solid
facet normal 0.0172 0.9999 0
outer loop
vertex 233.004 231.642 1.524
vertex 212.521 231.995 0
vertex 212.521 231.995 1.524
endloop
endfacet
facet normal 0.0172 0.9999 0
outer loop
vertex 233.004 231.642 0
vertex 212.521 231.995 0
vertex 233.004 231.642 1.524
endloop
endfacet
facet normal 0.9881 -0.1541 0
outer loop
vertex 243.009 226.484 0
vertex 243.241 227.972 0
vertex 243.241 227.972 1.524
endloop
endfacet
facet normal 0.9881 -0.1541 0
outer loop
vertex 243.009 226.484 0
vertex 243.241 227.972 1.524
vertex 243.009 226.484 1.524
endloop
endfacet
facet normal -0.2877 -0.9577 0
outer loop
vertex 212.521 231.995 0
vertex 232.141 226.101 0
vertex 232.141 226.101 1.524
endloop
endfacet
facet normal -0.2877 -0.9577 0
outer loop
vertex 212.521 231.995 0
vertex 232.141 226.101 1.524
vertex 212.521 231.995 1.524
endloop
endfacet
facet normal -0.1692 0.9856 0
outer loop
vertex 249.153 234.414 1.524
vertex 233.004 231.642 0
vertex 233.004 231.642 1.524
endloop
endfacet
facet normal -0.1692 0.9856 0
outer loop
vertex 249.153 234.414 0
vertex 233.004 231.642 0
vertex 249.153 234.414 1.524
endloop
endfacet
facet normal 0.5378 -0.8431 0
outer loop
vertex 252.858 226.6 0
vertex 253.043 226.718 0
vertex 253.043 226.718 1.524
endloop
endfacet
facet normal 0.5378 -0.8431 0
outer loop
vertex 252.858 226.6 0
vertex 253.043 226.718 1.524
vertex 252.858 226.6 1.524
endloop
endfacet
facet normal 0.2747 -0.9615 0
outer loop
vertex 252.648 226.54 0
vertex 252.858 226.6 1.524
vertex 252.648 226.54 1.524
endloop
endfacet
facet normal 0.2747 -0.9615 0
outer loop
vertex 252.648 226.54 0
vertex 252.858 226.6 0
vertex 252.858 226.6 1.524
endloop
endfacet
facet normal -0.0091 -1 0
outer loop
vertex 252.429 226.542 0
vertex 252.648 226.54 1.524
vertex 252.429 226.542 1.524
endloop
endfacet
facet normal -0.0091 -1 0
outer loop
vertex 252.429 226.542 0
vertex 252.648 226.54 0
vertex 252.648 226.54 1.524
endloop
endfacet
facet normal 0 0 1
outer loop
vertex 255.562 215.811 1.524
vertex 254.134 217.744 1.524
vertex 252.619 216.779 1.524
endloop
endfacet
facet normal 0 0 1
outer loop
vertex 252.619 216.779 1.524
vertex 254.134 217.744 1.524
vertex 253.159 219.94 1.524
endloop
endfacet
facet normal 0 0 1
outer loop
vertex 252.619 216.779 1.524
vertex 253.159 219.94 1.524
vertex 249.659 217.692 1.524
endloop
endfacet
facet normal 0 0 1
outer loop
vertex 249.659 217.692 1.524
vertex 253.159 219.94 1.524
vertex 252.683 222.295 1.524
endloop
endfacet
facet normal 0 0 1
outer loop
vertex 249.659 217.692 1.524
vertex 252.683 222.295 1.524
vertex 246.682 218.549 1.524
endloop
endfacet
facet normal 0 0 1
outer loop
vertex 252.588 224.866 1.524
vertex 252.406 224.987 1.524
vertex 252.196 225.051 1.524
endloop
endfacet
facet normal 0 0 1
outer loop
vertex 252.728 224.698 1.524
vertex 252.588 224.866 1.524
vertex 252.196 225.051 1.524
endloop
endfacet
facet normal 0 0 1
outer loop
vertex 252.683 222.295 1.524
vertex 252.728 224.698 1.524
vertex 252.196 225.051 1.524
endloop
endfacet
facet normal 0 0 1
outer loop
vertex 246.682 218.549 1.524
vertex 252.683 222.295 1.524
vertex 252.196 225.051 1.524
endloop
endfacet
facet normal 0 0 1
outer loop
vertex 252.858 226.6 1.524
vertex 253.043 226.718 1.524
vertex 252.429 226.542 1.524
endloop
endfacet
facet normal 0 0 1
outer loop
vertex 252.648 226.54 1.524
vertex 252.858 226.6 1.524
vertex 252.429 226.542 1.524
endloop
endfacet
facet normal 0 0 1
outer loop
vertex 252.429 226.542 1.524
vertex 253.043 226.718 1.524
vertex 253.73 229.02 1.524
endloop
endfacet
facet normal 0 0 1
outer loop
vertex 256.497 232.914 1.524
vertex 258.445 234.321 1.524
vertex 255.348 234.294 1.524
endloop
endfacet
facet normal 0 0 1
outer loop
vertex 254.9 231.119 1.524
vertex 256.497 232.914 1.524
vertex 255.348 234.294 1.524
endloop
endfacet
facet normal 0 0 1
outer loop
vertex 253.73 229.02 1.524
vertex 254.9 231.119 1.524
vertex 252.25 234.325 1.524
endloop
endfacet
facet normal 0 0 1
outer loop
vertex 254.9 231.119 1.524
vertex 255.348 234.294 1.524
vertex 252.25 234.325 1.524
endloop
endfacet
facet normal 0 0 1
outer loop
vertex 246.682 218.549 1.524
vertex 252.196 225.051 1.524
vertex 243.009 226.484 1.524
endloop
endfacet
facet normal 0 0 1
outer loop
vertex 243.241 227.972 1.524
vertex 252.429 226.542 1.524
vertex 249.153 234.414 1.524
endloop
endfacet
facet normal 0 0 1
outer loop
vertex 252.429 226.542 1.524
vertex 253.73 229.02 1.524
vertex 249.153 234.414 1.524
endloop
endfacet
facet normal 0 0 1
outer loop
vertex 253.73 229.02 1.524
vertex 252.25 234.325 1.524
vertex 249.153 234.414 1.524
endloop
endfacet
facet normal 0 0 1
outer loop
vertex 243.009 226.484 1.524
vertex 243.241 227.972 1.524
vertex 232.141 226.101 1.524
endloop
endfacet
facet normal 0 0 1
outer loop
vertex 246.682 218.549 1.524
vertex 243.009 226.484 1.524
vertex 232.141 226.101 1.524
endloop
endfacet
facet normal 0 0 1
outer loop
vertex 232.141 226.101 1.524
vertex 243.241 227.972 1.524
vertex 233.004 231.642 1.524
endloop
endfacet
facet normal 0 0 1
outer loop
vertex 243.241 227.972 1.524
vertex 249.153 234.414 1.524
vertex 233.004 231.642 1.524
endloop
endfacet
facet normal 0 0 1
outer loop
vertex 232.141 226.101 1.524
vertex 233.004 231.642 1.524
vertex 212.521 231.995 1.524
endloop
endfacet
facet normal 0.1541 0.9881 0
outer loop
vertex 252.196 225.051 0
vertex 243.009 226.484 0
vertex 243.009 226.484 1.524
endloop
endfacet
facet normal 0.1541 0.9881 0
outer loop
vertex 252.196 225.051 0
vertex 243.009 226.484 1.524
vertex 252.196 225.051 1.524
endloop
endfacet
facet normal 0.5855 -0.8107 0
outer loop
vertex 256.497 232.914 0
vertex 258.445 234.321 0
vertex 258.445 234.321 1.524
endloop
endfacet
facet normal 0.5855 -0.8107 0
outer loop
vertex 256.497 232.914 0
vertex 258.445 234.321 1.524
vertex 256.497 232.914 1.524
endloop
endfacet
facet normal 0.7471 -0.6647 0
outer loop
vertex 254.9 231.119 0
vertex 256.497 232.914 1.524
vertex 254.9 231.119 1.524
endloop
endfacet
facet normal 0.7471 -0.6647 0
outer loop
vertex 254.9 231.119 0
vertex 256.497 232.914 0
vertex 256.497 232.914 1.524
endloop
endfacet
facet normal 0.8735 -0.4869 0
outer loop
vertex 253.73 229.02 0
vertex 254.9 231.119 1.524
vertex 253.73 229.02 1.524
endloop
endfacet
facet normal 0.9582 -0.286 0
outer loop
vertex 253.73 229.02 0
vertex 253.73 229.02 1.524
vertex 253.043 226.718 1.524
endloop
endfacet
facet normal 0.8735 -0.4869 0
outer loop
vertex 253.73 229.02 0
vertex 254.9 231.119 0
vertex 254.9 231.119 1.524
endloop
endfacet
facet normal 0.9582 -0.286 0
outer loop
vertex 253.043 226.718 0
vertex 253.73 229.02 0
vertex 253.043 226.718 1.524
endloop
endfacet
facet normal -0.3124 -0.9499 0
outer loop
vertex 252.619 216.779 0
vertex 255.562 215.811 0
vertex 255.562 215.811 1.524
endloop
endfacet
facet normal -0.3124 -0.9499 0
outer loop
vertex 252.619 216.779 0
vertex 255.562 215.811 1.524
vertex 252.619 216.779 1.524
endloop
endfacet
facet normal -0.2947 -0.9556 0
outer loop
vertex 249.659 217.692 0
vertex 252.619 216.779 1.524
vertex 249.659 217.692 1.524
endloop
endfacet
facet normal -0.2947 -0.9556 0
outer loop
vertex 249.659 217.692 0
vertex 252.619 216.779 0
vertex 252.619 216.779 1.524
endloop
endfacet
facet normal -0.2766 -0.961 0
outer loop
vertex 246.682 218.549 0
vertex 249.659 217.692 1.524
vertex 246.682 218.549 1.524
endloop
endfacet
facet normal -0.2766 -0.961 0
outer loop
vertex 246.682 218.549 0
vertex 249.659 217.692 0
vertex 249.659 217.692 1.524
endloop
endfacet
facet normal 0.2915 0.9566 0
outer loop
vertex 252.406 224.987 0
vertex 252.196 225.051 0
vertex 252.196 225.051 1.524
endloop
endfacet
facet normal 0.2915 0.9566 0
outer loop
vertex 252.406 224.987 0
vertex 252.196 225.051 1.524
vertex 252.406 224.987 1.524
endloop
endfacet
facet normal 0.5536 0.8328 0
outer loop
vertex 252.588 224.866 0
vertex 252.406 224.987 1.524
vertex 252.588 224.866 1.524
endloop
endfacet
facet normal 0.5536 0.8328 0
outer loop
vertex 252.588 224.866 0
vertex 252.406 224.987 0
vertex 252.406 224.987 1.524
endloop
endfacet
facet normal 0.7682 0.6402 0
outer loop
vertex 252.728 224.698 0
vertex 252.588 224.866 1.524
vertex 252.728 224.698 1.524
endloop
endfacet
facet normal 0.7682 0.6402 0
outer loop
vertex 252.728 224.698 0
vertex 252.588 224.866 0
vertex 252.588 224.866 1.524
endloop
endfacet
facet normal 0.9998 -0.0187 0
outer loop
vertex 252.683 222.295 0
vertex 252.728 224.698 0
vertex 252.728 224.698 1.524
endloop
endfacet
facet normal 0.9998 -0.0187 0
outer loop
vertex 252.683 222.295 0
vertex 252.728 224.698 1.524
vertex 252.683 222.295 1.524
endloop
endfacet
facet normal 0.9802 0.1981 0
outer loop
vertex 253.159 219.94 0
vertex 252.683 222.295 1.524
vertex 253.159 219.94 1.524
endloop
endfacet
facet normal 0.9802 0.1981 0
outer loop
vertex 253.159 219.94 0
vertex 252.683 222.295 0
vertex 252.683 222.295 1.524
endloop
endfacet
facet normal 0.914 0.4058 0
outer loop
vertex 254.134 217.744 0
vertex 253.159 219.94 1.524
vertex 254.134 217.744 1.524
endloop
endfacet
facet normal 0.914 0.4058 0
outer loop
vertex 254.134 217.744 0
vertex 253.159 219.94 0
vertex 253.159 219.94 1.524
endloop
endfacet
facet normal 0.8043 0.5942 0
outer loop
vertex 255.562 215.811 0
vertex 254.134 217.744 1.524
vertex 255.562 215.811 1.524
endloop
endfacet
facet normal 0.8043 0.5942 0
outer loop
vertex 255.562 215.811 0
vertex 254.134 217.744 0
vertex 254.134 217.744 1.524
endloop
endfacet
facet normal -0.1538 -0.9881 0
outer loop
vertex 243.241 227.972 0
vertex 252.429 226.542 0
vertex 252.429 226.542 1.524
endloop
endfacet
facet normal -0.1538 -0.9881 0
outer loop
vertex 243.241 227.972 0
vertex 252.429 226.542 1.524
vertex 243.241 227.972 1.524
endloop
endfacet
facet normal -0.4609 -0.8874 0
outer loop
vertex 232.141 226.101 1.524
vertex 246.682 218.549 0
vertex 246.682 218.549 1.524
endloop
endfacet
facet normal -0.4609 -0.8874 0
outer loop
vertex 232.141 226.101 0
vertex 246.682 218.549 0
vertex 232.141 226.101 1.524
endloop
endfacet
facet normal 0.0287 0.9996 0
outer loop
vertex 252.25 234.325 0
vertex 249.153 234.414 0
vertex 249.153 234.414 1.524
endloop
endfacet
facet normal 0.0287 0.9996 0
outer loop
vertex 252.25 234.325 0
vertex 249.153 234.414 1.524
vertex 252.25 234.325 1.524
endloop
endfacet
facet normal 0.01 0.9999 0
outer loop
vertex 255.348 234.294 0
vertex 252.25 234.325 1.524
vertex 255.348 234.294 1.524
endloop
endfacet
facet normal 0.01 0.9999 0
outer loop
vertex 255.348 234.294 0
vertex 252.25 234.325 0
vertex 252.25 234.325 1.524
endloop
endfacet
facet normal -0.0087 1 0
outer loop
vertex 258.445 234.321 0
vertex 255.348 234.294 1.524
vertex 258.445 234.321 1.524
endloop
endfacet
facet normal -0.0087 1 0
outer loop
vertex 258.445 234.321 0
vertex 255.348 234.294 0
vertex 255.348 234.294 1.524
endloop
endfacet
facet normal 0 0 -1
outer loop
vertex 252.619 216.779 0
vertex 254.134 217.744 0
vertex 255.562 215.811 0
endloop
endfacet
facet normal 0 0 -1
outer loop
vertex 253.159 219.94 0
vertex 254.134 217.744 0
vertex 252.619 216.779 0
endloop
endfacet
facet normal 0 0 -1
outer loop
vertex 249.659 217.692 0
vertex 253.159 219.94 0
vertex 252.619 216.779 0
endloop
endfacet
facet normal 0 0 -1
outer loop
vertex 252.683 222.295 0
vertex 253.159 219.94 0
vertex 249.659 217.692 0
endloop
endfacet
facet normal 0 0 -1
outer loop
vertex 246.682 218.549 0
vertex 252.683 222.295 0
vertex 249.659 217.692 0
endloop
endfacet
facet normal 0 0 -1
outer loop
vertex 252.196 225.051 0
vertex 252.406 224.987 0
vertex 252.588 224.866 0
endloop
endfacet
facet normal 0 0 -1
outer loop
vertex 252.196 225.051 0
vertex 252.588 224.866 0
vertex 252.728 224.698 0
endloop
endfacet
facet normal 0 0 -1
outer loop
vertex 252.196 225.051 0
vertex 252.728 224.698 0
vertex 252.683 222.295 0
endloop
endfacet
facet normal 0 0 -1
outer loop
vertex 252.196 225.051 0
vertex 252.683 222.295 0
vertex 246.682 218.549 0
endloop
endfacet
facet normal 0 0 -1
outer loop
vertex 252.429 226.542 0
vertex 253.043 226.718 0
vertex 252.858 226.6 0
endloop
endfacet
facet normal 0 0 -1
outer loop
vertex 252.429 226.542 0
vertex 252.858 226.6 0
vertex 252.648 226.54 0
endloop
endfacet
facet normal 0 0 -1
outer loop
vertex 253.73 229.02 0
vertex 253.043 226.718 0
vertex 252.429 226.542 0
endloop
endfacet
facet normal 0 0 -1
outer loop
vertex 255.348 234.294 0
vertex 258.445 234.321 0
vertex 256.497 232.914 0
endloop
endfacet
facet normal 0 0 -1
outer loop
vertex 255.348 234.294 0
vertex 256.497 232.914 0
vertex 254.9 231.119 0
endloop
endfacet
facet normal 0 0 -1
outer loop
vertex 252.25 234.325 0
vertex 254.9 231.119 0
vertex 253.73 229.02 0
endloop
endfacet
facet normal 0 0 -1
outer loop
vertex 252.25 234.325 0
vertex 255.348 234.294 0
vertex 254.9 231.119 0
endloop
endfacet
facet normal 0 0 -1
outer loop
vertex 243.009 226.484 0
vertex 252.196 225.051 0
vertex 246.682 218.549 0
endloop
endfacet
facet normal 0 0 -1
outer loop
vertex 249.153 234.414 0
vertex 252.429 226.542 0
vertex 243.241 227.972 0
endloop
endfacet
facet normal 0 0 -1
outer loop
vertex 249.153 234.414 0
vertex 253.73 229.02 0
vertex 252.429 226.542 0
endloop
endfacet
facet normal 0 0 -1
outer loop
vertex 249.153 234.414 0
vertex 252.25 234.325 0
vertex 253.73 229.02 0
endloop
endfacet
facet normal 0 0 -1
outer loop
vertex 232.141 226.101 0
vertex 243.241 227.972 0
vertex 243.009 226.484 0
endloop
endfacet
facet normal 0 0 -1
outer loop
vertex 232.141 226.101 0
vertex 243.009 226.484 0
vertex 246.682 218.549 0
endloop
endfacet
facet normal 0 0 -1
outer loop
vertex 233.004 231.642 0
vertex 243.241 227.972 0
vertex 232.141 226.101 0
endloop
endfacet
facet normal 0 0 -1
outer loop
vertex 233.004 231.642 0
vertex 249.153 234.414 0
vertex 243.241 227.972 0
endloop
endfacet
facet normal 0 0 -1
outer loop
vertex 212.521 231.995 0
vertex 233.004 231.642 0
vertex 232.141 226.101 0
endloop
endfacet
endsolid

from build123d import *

# Parameters (mm, degrees)
BOSS_EXTRUDE1_DEPTH = 1.524


with BuildPart() as part:
    # Sketch1 → Boss-Extrude1 (new body)
    with BuildSketch(Plane.XY):
        with BuildLine():
            Line((243.009394749, 226.483628693), (252.19647472, 225.051376489))
            ThreePointArc((252.19647472, 225.051376489), (252.501172451, 224.932897548), (252.728179767, 224.697640997))
            ThreePointArc((252.728179767, 224.697640997), (253.158948075, 219.940008266), (255.562248507, 215.811476133))
            ThreePointArc((255.562248507, 215.811476133), (251.141222731, 217.242232573), (246.682055702, 218.549275922))
            Line((246.682055702, 218.549275922), (232.141476548, 226.101345829))
            Line((232.141476548, 226.101345829), (212.521244057, 231.994935761))
            Line((212.521244057, 231.994935761), (233.004487141, 231.64183795))
            Line((233.004487141, 231.64183795), (249.153153432, 234.413620597))
            ThreePointArc((249.153153432, 234.413620597), (253.798600989, 234.302490495), (258.445341479, 234.320813134))
            ThreePointArc((258.445341479, 234.320813134), (254.900209484, 231.11883411), (253.042819444, 226.717614645))
            ThreePointArc((253.042819444, 226.717614645), (252.755013662, 226.562547569), (252.428715894, 226.542355168))
            Line((252.428715894, 226.542355168), (243.241260726, 227.972198625))
            Line((243.241260726, 227.972198625), (243.009394749, 226.483628693))
        make_face()
    extrude(amount=BOSS_EXTRUDE1_DEPTH)


solid = part.part
